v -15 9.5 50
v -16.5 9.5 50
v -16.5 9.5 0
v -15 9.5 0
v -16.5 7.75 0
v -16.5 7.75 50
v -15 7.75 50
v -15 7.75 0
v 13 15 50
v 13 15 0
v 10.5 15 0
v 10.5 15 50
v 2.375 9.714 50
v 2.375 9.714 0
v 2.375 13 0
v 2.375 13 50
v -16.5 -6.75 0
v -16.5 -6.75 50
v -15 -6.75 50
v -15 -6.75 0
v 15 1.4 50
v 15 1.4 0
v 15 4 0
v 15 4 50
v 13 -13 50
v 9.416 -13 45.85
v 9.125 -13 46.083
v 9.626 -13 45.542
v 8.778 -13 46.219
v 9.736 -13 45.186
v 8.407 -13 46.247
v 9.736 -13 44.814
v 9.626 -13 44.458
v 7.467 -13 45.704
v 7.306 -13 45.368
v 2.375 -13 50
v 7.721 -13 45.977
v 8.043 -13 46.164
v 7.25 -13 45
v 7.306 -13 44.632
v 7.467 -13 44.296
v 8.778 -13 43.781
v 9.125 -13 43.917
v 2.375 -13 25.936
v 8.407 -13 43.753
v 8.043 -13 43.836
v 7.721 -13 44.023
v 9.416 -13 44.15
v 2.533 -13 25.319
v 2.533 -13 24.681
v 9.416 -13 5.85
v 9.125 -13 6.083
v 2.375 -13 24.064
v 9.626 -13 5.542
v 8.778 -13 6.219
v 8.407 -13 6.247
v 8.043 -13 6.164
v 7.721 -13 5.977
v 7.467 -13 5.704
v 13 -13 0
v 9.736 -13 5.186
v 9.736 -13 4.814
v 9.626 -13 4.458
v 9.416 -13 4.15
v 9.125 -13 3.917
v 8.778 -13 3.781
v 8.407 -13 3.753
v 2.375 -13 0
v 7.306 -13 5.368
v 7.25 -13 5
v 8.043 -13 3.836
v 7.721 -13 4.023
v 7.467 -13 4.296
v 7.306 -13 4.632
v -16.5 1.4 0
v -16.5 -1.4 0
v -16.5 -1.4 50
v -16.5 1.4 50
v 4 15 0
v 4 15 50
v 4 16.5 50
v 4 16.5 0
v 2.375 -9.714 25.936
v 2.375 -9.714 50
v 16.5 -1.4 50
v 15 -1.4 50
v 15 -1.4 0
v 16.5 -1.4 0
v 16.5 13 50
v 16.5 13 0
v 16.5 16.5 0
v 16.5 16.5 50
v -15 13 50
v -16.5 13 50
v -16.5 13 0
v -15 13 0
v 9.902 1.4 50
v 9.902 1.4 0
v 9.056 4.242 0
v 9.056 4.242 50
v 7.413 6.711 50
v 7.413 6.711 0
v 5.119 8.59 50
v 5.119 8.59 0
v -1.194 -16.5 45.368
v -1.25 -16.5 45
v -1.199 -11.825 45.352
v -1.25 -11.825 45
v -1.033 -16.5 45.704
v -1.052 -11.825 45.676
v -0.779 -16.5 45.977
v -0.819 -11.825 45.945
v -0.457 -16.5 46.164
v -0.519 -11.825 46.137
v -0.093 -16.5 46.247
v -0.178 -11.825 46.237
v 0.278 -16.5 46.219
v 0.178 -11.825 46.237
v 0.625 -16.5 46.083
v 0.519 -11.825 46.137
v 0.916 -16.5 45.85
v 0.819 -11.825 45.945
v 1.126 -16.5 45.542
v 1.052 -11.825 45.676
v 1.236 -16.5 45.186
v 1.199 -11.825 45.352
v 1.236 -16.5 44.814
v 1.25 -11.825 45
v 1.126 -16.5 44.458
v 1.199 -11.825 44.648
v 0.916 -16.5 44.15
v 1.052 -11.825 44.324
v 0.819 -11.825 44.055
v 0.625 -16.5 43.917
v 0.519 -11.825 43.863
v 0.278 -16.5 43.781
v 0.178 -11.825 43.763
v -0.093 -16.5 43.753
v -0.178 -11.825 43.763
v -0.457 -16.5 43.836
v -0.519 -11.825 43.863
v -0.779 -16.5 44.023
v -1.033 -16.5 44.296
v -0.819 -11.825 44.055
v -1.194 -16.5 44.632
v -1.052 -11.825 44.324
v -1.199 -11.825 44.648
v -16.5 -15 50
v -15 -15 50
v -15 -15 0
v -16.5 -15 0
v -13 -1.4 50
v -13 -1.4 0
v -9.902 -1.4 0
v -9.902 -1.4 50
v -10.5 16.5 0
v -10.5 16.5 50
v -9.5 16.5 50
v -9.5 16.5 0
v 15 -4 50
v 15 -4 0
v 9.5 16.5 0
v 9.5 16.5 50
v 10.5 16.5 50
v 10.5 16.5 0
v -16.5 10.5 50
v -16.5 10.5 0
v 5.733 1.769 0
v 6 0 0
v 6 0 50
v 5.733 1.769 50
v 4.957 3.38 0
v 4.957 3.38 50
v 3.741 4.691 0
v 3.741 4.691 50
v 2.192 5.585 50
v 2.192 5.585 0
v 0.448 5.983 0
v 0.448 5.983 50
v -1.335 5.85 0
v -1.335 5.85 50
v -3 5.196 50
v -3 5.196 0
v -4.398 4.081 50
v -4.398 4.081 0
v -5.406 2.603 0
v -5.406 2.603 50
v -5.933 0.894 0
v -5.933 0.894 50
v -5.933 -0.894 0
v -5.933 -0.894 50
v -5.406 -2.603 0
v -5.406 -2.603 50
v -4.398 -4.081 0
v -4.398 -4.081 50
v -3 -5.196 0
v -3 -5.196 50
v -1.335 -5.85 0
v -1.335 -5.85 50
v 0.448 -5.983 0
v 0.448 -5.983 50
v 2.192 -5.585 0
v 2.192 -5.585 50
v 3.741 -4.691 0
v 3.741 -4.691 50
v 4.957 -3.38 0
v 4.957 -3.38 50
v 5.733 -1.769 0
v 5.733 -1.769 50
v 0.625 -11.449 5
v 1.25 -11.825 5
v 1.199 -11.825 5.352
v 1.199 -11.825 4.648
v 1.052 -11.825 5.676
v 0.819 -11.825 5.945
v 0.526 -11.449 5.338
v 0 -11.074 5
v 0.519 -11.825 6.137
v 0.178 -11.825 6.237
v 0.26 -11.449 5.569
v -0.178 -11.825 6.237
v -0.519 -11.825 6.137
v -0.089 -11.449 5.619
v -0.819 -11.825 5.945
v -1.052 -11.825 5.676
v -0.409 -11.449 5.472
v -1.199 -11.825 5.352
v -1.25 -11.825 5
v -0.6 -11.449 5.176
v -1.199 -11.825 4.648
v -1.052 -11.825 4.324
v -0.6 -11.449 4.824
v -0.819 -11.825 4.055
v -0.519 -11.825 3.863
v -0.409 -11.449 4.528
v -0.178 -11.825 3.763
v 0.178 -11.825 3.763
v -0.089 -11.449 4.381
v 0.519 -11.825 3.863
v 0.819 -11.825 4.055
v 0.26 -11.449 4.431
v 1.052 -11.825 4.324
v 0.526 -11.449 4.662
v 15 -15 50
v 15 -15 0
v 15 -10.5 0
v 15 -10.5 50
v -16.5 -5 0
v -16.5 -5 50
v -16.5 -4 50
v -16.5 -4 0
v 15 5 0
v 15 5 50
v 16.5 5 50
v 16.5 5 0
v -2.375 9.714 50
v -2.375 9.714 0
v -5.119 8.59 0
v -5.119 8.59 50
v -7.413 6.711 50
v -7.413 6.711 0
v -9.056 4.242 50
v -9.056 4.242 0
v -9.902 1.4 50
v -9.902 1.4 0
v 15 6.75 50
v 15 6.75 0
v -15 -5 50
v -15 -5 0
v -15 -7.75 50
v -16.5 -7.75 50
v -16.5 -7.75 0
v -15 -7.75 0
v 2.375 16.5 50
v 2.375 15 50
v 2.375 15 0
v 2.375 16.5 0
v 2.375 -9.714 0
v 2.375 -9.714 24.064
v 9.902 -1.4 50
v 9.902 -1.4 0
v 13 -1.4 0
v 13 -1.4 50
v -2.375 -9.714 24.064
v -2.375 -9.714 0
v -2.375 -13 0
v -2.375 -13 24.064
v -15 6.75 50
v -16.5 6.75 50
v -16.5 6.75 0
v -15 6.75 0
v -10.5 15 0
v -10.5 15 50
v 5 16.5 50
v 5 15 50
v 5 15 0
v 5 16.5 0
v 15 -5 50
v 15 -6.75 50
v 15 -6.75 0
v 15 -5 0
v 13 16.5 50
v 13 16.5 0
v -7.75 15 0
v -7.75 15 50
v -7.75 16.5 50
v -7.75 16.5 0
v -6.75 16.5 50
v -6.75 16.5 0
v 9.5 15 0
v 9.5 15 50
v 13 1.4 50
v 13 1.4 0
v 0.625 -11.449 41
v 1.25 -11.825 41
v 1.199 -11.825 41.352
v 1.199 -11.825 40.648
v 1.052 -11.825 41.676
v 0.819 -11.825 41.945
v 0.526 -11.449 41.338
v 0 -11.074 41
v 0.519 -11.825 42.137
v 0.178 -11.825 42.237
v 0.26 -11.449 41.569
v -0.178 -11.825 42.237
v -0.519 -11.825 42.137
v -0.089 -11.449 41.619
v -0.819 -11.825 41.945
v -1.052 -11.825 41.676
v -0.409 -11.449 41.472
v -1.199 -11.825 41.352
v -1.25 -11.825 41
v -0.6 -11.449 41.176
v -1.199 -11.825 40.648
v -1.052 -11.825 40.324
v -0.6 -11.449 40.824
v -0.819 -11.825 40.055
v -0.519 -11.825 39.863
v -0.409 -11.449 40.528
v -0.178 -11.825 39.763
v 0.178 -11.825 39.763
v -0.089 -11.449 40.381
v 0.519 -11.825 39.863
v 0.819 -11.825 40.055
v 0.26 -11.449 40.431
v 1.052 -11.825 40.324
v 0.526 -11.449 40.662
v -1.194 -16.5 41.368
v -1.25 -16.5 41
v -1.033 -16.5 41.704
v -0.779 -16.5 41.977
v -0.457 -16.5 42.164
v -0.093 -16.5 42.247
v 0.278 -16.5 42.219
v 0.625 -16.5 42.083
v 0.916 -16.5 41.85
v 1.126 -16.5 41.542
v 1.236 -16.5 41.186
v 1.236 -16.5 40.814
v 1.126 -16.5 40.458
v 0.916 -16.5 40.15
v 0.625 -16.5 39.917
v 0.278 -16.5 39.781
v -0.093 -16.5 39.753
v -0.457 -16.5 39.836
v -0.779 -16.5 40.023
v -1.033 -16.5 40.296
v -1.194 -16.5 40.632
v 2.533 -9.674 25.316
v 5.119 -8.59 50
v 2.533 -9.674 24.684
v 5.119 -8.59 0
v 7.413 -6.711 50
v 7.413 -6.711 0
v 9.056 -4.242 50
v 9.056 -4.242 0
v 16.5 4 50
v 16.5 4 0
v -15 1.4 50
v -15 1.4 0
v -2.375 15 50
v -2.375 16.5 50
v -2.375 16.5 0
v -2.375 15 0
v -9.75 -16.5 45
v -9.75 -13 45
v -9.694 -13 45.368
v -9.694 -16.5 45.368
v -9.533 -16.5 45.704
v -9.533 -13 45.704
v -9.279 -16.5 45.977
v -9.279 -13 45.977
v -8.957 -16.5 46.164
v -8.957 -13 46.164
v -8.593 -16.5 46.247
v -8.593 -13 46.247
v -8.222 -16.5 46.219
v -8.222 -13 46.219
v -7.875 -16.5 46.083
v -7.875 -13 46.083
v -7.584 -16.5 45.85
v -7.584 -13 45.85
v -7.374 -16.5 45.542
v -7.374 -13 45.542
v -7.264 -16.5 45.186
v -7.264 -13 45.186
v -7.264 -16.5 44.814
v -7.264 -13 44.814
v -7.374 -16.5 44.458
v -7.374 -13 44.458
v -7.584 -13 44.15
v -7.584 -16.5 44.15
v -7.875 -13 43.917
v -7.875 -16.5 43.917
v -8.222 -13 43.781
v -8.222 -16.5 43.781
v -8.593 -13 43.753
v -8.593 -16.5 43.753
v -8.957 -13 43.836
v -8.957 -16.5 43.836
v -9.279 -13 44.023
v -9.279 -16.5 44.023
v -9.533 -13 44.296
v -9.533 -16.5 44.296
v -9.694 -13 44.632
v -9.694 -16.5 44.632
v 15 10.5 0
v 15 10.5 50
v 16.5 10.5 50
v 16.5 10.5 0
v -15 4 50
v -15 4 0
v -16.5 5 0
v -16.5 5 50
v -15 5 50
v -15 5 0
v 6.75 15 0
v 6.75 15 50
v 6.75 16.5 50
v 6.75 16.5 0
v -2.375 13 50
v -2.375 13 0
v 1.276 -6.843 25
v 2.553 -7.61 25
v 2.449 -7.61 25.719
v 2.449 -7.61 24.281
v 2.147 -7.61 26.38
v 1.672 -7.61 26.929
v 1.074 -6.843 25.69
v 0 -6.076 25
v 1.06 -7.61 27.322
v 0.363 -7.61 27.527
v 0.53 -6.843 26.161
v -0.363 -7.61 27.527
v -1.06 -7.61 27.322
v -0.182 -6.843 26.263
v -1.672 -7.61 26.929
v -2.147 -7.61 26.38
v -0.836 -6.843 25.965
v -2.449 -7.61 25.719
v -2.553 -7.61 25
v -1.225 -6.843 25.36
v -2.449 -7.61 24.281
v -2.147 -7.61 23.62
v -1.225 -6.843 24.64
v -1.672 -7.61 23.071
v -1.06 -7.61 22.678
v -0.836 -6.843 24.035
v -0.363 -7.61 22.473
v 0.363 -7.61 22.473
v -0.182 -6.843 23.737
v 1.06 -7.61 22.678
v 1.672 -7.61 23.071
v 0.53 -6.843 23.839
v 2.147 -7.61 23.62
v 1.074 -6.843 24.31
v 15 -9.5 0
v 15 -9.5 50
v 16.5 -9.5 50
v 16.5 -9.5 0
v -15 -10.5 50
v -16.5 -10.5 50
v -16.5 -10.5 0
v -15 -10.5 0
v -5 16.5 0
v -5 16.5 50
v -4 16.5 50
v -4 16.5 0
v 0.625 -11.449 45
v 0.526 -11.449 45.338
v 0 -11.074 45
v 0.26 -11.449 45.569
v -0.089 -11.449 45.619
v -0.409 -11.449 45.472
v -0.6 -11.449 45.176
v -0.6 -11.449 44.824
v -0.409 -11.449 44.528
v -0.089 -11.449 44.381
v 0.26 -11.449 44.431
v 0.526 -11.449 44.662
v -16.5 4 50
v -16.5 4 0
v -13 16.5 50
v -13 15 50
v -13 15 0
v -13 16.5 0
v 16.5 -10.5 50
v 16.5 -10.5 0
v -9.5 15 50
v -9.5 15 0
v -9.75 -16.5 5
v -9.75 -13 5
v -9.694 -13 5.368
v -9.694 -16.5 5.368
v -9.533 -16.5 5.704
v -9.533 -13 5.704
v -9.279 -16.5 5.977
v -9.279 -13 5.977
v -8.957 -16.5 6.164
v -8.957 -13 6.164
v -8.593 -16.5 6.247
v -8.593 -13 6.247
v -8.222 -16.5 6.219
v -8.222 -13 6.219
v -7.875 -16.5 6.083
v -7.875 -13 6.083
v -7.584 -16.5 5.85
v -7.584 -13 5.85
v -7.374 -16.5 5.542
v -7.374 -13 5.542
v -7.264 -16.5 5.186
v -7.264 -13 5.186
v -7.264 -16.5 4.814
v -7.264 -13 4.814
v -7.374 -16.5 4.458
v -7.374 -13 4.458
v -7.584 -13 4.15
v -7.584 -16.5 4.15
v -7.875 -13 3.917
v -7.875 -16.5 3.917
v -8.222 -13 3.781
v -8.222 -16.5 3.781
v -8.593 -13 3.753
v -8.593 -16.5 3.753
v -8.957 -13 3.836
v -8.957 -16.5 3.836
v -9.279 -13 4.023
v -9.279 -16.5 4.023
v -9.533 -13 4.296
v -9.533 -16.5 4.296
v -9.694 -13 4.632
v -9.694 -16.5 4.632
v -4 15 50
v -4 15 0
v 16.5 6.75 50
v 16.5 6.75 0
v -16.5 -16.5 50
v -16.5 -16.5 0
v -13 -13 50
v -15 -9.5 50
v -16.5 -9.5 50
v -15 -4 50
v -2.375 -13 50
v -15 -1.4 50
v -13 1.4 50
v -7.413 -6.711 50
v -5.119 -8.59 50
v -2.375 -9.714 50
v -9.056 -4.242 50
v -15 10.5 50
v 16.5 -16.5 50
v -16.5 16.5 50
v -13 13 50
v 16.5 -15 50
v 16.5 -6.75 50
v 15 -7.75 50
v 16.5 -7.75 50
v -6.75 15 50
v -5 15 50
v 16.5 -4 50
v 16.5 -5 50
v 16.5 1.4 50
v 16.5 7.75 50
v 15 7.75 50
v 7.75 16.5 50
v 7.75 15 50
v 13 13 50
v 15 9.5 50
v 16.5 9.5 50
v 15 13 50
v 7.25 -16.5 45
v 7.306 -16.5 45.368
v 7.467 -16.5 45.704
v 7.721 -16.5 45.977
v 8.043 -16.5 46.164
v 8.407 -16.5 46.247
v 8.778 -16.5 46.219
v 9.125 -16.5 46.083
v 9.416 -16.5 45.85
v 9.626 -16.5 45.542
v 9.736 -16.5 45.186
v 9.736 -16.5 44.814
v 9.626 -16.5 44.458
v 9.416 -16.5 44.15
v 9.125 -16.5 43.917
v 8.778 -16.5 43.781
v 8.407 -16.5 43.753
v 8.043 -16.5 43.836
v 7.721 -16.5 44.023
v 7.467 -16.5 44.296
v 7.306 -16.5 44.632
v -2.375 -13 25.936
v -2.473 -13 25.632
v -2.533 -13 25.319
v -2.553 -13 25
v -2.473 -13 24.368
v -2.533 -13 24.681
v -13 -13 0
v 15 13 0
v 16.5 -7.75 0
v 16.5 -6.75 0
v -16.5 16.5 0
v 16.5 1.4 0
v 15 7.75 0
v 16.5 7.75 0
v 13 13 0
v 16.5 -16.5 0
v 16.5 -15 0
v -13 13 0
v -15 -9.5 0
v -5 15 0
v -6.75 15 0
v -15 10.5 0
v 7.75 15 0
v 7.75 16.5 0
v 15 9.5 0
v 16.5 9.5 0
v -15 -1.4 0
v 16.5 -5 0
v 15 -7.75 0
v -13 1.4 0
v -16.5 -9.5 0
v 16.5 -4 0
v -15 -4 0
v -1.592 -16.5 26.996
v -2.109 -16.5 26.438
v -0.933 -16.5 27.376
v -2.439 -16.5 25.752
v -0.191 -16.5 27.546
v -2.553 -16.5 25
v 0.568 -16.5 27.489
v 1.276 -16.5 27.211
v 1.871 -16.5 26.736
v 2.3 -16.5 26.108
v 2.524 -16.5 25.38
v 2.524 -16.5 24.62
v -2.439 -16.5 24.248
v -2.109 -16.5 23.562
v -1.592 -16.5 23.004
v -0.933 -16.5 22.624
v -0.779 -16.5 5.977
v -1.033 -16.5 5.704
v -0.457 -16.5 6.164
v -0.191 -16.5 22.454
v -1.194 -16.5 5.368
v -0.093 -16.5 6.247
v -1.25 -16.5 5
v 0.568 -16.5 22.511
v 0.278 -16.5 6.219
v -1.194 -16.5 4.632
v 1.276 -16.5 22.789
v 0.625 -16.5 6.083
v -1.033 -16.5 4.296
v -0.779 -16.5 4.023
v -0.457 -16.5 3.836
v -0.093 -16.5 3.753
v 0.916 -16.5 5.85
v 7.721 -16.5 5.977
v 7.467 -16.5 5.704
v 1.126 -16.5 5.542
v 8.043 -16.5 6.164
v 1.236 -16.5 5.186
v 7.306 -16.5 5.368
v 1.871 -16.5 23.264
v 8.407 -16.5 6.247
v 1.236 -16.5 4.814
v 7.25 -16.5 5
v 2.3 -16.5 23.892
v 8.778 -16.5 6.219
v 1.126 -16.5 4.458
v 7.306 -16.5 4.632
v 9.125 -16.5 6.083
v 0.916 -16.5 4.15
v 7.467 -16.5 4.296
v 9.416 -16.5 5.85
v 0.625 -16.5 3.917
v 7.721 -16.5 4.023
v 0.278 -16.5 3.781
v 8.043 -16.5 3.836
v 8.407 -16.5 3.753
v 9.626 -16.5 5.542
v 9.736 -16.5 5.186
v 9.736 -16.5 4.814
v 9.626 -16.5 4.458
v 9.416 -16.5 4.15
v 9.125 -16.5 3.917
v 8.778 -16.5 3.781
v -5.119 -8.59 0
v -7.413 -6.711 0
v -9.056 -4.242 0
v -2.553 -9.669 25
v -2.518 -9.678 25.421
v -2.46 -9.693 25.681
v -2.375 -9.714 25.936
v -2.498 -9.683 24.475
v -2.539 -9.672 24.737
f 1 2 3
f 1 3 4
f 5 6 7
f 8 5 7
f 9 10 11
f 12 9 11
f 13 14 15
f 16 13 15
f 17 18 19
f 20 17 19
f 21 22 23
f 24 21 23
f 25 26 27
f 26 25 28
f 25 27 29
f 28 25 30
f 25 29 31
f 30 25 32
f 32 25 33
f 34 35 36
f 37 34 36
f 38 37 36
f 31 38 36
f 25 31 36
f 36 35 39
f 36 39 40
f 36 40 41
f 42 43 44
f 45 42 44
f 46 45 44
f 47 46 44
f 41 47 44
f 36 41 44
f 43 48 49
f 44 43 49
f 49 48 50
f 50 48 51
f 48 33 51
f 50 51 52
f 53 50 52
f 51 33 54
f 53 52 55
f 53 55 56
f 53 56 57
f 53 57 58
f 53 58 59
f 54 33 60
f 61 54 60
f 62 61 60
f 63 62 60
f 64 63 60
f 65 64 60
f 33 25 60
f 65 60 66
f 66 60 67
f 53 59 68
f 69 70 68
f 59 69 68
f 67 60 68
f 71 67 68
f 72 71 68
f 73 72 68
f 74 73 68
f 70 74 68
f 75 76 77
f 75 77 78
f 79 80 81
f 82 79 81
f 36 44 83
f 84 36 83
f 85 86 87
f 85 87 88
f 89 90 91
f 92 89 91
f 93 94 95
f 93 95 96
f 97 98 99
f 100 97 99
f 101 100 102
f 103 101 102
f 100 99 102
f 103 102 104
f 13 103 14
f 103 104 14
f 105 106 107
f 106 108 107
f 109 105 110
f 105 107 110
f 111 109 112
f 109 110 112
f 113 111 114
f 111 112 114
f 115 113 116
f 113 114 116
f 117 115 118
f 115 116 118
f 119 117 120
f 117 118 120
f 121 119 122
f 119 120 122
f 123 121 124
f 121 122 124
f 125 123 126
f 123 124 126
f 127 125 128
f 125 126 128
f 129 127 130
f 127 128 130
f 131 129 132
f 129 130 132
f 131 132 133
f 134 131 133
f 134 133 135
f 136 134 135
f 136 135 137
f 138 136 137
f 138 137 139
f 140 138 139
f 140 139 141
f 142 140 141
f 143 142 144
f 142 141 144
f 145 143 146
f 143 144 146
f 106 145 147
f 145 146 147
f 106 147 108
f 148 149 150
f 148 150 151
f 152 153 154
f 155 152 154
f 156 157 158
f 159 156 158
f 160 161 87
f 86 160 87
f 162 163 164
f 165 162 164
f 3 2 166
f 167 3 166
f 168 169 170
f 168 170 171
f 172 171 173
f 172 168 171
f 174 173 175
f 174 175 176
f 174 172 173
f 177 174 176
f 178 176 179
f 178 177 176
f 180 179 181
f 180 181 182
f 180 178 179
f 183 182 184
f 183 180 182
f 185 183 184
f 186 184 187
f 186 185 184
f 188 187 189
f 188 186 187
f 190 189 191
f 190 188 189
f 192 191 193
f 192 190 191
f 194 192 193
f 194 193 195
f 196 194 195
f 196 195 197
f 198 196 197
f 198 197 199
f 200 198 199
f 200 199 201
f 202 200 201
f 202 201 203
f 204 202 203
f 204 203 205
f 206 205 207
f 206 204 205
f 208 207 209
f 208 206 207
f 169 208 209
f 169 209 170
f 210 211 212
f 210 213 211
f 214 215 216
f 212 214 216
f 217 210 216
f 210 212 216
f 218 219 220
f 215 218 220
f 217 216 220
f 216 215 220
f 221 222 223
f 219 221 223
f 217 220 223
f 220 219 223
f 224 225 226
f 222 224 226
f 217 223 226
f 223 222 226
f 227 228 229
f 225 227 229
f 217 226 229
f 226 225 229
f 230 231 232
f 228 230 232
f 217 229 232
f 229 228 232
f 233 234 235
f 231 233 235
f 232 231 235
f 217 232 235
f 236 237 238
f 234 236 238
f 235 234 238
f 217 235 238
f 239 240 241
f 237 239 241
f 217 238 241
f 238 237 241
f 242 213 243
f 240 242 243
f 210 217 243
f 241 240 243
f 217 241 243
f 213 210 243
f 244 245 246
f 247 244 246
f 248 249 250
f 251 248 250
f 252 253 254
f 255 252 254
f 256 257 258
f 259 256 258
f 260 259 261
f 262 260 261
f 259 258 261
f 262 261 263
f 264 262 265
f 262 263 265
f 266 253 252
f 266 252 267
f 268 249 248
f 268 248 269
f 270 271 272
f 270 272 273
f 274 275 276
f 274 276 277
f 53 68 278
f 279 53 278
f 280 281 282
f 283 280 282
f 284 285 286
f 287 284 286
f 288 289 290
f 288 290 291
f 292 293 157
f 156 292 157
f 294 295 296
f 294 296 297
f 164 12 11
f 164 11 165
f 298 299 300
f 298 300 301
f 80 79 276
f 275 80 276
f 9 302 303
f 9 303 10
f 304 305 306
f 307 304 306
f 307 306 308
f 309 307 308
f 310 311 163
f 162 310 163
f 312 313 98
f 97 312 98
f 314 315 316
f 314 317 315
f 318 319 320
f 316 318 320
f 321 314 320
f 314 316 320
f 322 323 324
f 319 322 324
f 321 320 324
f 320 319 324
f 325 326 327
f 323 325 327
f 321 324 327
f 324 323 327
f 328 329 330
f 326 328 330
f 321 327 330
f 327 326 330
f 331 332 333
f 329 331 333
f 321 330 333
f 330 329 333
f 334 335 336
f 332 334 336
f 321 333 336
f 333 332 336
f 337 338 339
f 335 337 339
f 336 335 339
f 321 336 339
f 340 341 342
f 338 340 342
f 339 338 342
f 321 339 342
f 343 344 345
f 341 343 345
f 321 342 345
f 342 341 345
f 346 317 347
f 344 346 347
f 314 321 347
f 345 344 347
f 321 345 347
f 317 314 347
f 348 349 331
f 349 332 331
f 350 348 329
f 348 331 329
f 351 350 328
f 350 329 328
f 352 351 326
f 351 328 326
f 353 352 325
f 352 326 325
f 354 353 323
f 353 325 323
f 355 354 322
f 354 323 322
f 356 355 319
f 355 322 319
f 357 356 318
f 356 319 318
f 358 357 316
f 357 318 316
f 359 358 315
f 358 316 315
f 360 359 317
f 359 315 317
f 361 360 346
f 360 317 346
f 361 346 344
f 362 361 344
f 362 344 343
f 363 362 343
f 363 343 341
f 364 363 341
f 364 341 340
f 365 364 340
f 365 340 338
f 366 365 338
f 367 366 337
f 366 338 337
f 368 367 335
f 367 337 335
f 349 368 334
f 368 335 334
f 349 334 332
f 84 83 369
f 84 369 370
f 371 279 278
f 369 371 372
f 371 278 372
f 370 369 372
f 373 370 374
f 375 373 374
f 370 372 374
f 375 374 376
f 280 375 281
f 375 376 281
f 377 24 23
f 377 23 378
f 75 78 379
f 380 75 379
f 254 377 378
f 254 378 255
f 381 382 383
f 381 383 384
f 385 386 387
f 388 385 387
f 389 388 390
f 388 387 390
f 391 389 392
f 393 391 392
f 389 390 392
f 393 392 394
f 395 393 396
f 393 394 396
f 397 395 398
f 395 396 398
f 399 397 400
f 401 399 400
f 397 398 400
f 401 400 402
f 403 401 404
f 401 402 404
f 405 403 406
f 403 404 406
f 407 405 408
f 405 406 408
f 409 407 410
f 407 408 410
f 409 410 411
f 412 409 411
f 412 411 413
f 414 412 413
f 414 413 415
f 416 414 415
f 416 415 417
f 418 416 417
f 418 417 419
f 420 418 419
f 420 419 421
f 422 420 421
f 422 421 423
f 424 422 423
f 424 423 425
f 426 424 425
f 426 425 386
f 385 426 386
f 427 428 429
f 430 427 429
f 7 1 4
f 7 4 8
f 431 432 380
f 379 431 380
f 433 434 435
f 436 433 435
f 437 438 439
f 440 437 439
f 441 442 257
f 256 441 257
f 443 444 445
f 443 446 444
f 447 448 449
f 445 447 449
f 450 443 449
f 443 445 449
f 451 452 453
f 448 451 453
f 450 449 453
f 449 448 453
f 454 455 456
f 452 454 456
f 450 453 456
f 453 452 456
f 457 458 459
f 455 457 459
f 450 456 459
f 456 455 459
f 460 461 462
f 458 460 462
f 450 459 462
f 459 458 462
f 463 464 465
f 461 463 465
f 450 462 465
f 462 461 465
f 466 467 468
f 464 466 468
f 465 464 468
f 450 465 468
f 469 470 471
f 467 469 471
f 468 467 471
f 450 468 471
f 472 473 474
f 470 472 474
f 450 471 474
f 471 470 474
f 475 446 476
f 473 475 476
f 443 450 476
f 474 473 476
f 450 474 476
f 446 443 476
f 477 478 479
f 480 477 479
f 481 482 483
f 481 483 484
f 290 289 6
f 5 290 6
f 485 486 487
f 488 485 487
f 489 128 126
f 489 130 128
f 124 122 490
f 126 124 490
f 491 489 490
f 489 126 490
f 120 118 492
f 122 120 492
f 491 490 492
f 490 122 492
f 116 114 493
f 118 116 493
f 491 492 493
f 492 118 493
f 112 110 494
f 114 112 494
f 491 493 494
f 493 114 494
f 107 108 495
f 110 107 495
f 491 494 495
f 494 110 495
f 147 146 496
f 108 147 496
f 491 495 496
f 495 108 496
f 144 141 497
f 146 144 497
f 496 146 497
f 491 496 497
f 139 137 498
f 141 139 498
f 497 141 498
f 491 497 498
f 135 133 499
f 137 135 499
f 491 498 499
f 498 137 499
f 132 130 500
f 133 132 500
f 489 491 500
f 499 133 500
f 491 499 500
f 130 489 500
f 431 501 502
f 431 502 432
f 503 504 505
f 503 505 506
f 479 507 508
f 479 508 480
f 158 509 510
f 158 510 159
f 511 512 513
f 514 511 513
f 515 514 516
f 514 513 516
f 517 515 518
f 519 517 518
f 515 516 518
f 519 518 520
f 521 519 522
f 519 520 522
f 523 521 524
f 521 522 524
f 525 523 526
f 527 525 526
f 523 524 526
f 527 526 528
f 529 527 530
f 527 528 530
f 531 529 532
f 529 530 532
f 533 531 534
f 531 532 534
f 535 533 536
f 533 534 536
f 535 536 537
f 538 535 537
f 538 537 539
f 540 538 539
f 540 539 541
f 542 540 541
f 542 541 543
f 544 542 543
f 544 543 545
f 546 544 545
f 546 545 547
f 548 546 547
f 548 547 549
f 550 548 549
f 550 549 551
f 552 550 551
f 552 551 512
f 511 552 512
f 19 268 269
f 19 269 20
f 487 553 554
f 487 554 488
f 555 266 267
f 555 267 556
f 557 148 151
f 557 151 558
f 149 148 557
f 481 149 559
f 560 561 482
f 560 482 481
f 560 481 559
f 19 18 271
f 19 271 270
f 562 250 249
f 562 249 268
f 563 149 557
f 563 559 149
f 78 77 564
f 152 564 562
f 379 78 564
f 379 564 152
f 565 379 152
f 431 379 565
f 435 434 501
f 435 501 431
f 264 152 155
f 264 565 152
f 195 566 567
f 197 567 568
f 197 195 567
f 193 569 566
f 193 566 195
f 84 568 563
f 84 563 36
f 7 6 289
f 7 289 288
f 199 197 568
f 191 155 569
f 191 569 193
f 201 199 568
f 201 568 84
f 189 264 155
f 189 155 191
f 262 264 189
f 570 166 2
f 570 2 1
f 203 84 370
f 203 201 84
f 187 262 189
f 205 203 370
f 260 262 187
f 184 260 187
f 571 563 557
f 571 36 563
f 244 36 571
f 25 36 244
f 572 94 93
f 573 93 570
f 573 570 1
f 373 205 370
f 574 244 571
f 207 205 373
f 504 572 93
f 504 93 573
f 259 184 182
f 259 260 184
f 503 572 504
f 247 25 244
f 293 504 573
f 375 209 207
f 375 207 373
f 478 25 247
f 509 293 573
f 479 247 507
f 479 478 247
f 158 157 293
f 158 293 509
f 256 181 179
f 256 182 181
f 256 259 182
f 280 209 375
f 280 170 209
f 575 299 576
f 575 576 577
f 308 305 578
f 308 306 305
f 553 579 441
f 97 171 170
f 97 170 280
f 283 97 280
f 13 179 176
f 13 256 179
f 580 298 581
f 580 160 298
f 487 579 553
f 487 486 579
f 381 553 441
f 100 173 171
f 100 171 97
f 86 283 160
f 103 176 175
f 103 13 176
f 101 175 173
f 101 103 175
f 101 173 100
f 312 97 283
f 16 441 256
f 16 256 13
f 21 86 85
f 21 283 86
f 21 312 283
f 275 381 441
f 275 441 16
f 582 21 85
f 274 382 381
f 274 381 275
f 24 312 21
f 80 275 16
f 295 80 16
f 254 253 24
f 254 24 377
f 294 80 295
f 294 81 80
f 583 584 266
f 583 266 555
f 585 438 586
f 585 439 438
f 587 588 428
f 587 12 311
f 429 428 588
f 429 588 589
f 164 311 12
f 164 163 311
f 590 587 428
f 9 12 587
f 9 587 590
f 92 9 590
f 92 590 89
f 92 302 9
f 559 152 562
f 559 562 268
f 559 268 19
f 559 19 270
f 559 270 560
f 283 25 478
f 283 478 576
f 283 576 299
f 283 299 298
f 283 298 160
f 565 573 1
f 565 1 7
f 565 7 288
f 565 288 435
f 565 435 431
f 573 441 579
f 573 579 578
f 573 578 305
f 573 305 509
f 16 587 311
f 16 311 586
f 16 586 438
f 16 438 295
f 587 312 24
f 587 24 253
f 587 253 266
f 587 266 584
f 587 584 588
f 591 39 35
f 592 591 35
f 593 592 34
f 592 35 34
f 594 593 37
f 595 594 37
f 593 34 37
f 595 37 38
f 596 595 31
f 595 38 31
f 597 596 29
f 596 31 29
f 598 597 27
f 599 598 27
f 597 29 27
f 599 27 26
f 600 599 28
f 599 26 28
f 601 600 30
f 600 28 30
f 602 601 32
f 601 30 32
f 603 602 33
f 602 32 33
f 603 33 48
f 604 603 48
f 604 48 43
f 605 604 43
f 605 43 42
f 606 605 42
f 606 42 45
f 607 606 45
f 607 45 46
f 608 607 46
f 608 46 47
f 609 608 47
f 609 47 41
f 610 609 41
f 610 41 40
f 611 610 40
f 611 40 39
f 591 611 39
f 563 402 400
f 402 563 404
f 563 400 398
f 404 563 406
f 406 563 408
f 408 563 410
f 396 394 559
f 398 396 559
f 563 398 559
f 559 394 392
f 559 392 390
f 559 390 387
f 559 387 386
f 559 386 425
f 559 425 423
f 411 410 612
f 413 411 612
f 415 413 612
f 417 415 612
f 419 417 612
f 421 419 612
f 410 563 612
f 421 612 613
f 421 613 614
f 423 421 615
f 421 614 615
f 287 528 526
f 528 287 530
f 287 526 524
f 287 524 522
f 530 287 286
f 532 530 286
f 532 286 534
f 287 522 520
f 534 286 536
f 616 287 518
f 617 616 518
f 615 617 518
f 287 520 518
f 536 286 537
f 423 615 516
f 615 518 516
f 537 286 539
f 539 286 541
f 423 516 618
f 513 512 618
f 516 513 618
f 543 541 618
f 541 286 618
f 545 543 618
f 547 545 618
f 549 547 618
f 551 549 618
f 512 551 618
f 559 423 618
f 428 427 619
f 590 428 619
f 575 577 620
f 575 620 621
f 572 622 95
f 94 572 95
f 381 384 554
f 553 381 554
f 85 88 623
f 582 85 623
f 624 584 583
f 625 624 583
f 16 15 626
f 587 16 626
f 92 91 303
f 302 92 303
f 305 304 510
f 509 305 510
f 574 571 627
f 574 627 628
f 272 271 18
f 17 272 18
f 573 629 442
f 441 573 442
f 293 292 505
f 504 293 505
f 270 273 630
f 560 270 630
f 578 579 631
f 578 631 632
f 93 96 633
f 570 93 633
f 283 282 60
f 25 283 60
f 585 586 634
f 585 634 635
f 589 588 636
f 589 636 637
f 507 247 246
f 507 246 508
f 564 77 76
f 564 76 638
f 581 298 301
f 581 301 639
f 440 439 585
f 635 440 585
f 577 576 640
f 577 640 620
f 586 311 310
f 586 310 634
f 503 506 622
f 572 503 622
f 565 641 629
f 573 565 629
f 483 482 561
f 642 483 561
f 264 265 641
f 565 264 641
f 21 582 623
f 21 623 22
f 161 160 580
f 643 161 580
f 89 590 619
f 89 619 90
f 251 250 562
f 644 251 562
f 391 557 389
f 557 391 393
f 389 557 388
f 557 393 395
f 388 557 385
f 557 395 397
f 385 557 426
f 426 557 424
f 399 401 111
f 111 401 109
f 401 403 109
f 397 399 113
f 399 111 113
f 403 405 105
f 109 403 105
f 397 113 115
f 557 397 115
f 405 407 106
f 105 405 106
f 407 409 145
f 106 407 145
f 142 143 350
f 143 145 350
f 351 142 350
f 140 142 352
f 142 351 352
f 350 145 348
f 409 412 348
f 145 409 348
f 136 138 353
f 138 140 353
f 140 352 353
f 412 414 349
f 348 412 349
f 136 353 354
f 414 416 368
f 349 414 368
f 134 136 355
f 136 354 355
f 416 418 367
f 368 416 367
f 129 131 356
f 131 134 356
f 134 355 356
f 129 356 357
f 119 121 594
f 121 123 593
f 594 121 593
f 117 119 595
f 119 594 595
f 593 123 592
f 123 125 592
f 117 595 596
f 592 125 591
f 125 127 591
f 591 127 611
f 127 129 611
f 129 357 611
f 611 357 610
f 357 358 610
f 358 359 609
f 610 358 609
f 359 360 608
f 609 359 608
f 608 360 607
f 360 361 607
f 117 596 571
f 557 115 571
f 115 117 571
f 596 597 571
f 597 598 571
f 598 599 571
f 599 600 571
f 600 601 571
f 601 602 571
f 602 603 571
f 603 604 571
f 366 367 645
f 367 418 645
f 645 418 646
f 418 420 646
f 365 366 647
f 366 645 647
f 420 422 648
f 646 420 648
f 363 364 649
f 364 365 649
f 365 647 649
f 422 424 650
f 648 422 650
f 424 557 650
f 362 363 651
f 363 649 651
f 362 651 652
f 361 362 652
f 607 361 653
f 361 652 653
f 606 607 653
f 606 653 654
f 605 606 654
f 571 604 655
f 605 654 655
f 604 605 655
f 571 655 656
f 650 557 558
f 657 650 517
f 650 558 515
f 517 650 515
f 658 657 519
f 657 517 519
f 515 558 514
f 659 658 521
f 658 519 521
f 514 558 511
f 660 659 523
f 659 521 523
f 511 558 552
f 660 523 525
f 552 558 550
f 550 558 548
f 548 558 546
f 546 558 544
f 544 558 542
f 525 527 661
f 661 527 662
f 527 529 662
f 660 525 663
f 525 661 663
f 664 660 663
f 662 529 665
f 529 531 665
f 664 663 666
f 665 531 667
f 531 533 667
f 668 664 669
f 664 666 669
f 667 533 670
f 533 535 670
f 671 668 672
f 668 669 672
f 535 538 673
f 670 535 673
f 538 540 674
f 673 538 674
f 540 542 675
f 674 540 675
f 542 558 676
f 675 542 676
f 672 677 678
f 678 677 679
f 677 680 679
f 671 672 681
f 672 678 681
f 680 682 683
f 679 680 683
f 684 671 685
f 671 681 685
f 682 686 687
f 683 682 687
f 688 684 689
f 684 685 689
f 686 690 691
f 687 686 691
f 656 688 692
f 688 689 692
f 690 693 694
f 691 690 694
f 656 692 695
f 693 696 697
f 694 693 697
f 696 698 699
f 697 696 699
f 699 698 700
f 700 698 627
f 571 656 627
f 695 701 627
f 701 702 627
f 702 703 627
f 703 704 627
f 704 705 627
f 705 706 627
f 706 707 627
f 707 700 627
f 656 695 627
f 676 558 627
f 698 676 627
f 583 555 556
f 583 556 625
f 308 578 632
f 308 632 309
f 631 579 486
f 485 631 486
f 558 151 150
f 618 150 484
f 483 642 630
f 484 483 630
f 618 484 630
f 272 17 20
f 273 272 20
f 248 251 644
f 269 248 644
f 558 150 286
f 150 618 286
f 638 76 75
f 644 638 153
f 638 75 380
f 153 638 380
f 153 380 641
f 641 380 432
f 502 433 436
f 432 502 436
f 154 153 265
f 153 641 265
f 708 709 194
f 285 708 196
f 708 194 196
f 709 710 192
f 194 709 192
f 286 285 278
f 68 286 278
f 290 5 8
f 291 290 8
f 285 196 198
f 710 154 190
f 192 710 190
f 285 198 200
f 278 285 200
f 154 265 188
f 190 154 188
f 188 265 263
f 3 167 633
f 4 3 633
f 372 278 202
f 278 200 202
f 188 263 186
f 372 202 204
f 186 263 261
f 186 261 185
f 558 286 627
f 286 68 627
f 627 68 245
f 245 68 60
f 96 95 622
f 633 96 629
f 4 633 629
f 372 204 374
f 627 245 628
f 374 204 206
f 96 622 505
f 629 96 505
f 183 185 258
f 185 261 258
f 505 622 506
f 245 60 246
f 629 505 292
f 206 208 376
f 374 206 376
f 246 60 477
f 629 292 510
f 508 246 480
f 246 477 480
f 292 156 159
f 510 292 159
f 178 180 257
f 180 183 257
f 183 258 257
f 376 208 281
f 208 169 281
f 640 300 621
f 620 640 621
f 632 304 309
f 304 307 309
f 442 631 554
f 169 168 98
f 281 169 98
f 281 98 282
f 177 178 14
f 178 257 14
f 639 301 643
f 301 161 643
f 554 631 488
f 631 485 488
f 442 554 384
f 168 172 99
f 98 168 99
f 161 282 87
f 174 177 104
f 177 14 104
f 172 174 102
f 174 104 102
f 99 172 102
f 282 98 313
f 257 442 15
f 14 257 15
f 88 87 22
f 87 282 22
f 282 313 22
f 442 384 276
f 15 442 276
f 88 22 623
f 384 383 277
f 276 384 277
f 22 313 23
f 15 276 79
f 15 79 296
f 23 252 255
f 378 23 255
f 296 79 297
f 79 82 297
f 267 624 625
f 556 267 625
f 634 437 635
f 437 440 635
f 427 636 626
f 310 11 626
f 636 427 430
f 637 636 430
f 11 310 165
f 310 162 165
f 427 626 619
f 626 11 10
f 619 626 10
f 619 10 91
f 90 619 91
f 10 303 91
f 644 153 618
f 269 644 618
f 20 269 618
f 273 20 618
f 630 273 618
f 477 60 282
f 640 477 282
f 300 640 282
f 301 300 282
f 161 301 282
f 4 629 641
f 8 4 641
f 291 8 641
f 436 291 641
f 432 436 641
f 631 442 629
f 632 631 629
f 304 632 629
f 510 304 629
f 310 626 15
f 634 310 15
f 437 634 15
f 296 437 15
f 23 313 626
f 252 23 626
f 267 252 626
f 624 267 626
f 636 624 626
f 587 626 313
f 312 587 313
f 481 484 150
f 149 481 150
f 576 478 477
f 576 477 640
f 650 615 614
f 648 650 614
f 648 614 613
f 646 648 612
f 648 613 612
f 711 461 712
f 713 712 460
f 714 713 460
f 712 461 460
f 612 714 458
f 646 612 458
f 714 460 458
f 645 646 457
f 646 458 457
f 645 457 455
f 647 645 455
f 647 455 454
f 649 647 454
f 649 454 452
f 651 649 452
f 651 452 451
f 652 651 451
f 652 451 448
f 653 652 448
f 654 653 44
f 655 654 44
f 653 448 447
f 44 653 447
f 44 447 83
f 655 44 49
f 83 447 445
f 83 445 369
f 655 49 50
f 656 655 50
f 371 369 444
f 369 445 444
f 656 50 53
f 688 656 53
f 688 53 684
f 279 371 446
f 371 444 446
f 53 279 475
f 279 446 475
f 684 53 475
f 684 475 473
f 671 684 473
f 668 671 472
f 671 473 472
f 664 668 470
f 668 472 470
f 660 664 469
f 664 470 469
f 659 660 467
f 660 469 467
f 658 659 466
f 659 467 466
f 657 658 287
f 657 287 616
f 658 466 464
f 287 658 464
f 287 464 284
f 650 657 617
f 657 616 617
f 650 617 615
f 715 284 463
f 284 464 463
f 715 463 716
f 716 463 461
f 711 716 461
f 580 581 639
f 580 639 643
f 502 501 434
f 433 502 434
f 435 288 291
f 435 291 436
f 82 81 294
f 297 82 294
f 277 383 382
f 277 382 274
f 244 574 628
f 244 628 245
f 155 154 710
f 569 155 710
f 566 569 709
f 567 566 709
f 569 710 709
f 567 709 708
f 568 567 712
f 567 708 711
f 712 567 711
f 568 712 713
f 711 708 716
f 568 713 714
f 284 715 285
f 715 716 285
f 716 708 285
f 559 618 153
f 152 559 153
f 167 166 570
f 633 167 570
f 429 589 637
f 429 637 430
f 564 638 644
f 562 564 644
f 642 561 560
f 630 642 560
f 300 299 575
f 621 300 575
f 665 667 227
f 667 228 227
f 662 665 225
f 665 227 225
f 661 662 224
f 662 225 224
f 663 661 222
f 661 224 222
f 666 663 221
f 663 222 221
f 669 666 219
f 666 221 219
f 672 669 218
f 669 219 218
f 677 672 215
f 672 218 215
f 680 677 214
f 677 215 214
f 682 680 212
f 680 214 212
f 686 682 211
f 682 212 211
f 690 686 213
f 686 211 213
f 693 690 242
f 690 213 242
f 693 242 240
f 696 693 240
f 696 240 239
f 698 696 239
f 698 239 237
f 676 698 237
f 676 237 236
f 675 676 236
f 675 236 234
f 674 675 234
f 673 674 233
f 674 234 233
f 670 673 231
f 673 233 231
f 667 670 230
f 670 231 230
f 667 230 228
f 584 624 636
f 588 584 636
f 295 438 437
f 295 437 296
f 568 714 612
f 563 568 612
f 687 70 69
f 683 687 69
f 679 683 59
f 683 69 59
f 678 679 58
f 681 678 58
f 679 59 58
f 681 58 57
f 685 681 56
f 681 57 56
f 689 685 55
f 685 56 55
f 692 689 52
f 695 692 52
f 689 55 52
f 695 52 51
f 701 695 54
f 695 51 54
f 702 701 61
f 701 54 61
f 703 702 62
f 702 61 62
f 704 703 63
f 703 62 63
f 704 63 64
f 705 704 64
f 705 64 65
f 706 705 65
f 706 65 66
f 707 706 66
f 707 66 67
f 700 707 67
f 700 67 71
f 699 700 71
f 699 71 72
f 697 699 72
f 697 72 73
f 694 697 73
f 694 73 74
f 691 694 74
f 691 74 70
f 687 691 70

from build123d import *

# Parameters (mm, degrees)
F0_W     = 1
F0_H     = 1.5
F0_W_2   = 2
F0_H_2   = 2
F0_W_3   = 4.75
F0_W_4   = 1.5
F0_H_3   = 1
F0_H_4   = 2.8
F0_R     = 6
F1_DEPTH = 50
F3_D     = 5.1054
F3_DEPTH = 8.89
F3_TIP   = 1.5338169022
F4_D     = 2.5
F4_DEPTH = 4.675
F4_TIP   = 0.7510757738


with BuildPart() as f1:
    # F0 (on Top) → F1 (new body)
    with BuildSketch(Plane.XY):
        with Locations((-10, 15.75)):
            Rectangle(F0_W, F0_H)
        with Locations((-7.25, 15.75)):
            Rectangle(F0_W, F0_H)
        with Locations((-4.5, 15.75)):
            Rectangle(F0_W, F0_H)
        with Locations((4.5, 15.75)):
            Rectangle(F0_W, F0_H)
        with Locations((7.25, 15.75)):
            Rectangle(F0_W, F0_H)
        with Locations((10, 15.75)):
            Rectangle(F0_W, F0_H)
        Polygon((16.5, 13), (16.5, 16.5), (13, 16.5), (13, 15), (15, 15), (15, 13), align=None)
        with Locations((14, 14)):
            Rectangle(F0_W_2, F0_H_2)
        Polygon((13, 13), (13, 15), (10.5, 15), (9.5, 15), (7.75, 15), (6.75, 15), (5, 15), (4, 15), (2.375, 15), (2.375, 13), align=None)
        with Locations((0, 14)):
            Rectangle(F0_W_3, F0_H_2)
        with Locations((0, 15.75)):
            Rectangle(F0_W_3, F0_H)
        Polygon((-13, 13), (-2.375, 13), (-2.375, 15), (-4, 15), (-5, 15), (-6.75, 15), (-7.75, 15), (-9.5, 15), (-10.5, 15), (-13, 15), align=None)
        with Locations((-14, 14)):
            Rectangle(F0_W_2, F0_H_2)
        Polygon((-16.5, 13), (-15, 13), (-15, 15), (-13, 15), (-13, 16.5), (-16.5, 16.5), align=None)
        Polygon((-13, 1.4), (-13, 13), (-15, 13), (-15, 10.5), (-15, 9.5), (-15, 7.75), (-15, 6.75), (-15, 5), (-15, 4), (-15, 1.4), align=None)
        with Locations((-15.75, 10)):
            Rectangle(F0_W_4, F0_H_3)
        with Locations((-15.75, 7.25)):
            Rectangle(F0_W_4, F0_H_3)
        with Locations((-15.75, 4.5)):
            Rectangle(F0_W_4, F0_H_3)
        with Locations((-15.75, 0)):
            Rectangle(F0_W_4, F0_H_4)
        with Locations((-15.75, -4.5)):
            Rectangle(F0_W_4, F0_H_3)
        with Locations((-15.75, -7.25)):
            Rectangle(F0_W_4, F0_H_3)
        with Locations((-15.75, -10)):
            Rectangle(F0_W_4, F0_H_3)
        Polygon((-2.375, -15), (-2.375, -13), (-13, -13), (-13, -1.4), (-15, -1.4), (-15, -4), (-15, -5), (-15, -6.75), (-15, -7.75), (-15, -9.5), (-15, -10.5), (-15, -15), align=None)
        with Locations((-14, 0)):
            Rectangle(F0_W_2, F0_H_4)
        with BuildLine():
            ThreePointArc((-9.9015150356, -1.4), (-10, 0), (-9.9015150356, 1.4))
            Line((-9.9015150356, 1.4), (-13, 1.4))
            Line((-13, 1.4), (-13, -1.4))
            Line((-13, -1.4), (-9.9015150356, -1.4))
        make_face()
        with BuildLine():
            Line((2.375, 9.7138753852), (2.375, 13))
            Line((2.375, 13), (-2.375, 13))
            Line((-2.375, 13), (-2.375, 9.7138753852))
            ThreePointArc((-2.375, 9.7138753852), (0, 10), (2.375, 9.7138753852))
        make_face()
        with BuildLine():
            Line((13, -1.4), (13, 1.4))
            Line((13, 1.4), (9.9015150356, 1.4))
            ThreePointArc((9.9015150356, 1.4), (9.9753483738, 0.7017298783), (10, 0))
            ThreePointArc((10, 0), (9.9753483738, -0.7017298783), (9.9015150356, -1.4))
            Line((9.9015150356, -1.4), (13, -1.4))
        make_face()
        with Locations((14, 0)):
            Rectangle(F0_W_2, F0_H_4)
        with Locations((15.75, 10)):
            Rectangle(F0_W_4, F0_H_3)
        with Locations((15.75, 7.25)):
            Rectangle(F0_W_4, F0_H_3)
        with Locations((15.75, 4.5)):
            Rectangle(F0_W_4, F0_H_3)
        with Locations((15.75, 0)):
            Rectangle(F0_W_4, F0_H_4)
        Polygon((15, 10.5), (15, 13), (13, 13), (13, 1.4), (15, 1.4), (15, 4), (15, 5), (15, 6.75), (15, 7.75), (15, 9.5), align=None)
        Polygon((15, -1.4), (13, -1.4), (13, -13), (2.375, -13), (2.375, -15), (15, -15), (15, -10.5), (15, -9.5), (15, -7.75), (15, -6.75), (15, -5), (15, -4), align=None)
        with Locations((15.75, -4.5)):
            Rectangle(F0_W_4, F0_H_3)
        with Locations((15.75, -7.25)):
            Rectangle(F0_W_4, F0_H_3)
        with Locations((15.75, -10)):
            Rectangle(F0_W_4, F0_H_3)
        with Locations((0, -14)):
            Rectangle(F0_W_3, F0_H_2)
        with Locations((0, -15.75)):
            Rectangle(F0_W_3, F0_H)
        Polygon((15, -15), (2.375, -15), (2.375, -16.5), (16.5, -16.5), (16.5, -15), align=None)
        Polygon((-2.375, -16.5), (-2.375, -15), (-15, -15), (-16.5, -15), (-16.5, -16.5), align=None)
        with BuildLine():
            Line((2.375, -13), (2.375, -9.7138753852))
            ThreePointArc((2.375, -9.7138753852), (0, -10), (-2.375, -9.7138753852))
            Line((-2.375, -9.7138753852), (-2.375, -13))
            Line((-2.375, -13), (2.375, -13))
        make_face()
        with BuildLine():
            ThreePointArc((10, 0), (9.9753483738, 0.7017298783), (9.9015150356, 1.4))
            ThreePointArc((9.9015150356, 1.4), (7.4133889912, 6.7113086403), (2.375, 9.7138753852))
            ThreePointArc((2.375, 9.7138753852), (0, 10), (-2.375, 9.7138753852))
            ThreePointArc((-2.375, 9.7138753852), (-7.4133889912, 6.7113086403), (-9.9015150356, 1.4))
            ThreePointArc((-9.9015150356, 1.4), (-10, 0), (-9.9015150356, -1.4))
            ThreePointArc((-9.9015150356, -1.4), (-7.4133889912, -6.7113086403), (-2.375, -9.7138753852))
            ThreePointArc((-2.375, -9.7138753852), (0, -10), (2.375, -9.7138753852))
            ThreePointArc((2.375, -9.7138753852), (7.4133889912, -6.7113086403), (9.9015150356, -1.4))
            ThreePointArc((9.9015150356, -1.4), (9.9753483738, -0.7017298783), (10, 0))
        make_face()
        Circle(F0_R, mode=Mode.SUBTRACT)
    extrude(amount=F1_DEPTH)

    # F3
    with Locations(Plane.XZ.offset(16.5)):
        with Locations((0, 25)):
            Hole(F3_D / 2, depth=F3_DEPTH)
            with Locations((0, 0, -(F3_DEPTH + F3_TIP / 2))):  # 118° drill point
                Cone(0, F3_D / 2, F3_TIP, mode=Mode.SUBTRACT)

    # F4
    with Locations(Plane.XZ.offset(16.5)):
        with Locations((-8.5, 45), (0, 45), (0, 41), (8.5, 45), (8.5, 5), (0, 5), (-8.5, 5)):
            Hole(F4_D / 2, depth=F4_DEPTH)
            with Locations((0, 0, -(F4_DEPTH + F4_TIP / 2))):  # 118° drill point
                Cone(0, F4_D / 2, F4_TIP, mode=Mode.SUBTRACT)


solid = f1.part
